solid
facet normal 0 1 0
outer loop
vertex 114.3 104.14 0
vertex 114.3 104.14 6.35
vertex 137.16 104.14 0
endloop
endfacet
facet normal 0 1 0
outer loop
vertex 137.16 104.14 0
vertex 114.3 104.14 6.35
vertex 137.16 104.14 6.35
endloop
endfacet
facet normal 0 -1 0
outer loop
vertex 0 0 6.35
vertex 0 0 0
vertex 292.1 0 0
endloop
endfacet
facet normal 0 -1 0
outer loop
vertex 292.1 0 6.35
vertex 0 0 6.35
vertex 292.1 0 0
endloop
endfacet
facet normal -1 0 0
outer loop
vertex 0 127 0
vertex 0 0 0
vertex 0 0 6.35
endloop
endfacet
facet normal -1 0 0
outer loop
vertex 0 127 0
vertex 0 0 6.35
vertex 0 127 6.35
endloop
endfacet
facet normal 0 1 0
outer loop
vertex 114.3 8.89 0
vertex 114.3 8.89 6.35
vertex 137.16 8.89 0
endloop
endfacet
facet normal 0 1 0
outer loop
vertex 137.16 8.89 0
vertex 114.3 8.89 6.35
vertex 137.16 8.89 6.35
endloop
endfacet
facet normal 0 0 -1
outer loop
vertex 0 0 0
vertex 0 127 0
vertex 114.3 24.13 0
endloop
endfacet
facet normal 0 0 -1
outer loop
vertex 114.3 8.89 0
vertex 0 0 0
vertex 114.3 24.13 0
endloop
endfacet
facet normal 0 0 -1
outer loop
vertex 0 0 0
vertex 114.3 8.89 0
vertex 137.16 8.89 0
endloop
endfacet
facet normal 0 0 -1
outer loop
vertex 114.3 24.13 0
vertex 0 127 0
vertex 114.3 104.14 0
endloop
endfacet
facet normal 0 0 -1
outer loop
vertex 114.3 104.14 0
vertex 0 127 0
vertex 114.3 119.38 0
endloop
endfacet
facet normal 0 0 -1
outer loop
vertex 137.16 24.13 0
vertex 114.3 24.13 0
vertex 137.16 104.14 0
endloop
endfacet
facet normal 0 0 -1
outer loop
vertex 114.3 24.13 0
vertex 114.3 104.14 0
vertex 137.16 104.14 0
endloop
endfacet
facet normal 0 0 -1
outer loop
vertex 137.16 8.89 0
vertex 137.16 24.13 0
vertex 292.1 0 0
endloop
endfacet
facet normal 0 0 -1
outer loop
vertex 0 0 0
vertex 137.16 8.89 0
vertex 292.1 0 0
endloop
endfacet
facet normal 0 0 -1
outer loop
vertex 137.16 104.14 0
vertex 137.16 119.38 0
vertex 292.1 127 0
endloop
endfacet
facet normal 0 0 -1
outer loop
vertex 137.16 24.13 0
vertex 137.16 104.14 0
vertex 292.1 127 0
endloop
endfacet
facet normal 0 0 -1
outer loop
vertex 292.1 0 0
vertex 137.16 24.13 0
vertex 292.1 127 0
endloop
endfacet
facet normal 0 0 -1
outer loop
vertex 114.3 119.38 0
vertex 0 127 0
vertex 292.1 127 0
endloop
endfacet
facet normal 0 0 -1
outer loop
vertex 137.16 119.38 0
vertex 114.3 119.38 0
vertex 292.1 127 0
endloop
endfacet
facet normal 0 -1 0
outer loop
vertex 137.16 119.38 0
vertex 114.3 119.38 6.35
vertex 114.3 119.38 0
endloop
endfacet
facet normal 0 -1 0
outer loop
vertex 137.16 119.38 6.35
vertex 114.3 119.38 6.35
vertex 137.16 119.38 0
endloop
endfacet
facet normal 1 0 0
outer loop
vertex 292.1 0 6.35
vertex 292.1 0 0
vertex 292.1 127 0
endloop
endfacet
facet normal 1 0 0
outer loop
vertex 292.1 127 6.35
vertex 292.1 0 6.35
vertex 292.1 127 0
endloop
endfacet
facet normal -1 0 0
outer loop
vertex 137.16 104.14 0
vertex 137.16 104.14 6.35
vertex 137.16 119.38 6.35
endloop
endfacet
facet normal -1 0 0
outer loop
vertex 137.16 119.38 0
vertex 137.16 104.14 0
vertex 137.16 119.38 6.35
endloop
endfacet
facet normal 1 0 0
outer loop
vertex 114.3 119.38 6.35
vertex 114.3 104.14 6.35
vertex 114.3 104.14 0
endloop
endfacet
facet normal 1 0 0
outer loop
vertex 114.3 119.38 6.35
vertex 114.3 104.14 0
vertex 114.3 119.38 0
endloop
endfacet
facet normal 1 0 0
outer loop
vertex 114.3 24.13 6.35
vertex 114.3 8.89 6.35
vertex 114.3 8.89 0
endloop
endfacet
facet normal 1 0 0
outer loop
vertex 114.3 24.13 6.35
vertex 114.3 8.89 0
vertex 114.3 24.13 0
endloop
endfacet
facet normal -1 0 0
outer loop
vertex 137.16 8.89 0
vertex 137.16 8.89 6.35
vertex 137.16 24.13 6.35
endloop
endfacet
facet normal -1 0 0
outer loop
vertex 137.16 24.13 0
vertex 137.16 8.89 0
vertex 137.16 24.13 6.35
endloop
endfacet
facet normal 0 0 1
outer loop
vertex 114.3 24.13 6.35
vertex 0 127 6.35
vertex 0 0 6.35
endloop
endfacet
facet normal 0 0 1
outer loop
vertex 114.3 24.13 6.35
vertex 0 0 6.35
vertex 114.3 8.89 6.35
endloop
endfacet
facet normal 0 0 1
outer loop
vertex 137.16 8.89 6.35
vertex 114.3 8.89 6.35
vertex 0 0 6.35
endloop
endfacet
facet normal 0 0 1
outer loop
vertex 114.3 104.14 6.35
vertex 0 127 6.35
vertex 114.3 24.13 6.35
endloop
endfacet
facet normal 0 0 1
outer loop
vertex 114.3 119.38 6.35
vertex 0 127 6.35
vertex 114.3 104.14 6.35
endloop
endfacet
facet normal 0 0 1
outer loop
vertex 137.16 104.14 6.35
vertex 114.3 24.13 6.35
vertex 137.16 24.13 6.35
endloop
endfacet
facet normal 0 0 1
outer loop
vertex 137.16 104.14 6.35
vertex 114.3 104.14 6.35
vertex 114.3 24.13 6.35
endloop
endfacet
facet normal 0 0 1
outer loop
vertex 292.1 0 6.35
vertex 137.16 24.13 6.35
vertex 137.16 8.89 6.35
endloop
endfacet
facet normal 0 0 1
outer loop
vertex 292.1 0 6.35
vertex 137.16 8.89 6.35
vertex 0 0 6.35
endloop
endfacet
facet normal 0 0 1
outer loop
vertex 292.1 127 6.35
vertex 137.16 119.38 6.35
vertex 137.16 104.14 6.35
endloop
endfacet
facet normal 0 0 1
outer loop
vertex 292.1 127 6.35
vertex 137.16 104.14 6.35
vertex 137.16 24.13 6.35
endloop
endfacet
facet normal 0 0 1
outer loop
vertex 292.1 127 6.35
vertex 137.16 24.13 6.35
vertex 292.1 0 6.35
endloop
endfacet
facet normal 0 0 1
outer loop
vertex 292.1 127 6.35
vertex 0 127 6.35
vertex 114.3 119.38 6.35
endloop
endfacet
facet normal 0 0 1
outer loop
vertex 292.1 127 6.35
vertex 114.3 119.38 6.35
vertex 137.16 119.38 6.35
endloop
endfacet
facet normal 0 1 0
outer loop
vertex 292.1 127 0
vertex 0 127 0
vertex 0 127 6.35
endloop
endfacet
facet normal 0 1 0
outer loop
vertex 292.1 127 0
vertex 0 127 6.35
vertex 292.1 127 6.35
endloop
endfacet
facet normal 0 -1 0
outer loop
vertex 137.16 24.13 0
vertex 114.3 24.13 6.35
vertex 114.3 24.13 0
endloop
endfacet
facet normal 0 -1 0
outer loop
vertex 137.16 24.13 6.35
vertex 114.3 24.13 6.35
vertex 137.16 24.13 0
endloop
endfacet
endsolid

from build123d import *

# Parameters (mm, degrees)
SKETCH1_W           = 292.1
SKETCH1_H           = 127
BOSS_EXTRUDE1_DEPTH = 6.35
SKETCH2_W           = 22.86
SKETCH2_H           = 15.24
CUT_EXTRUDE1_DEPTH  = 6.35
LPATTERN1_COUNT     = 2
LPATTERN1_PITCH     = 95.25


with BuildPart() as part:
    # Sketch1 → Boss-Extrude1 (new body)
    with BuildSketch(Plane.XY):
        with Locations((146.05, 63.5)):
            Rectangle(SKETCH1_W, SKETCH1_H)
    extrude(amount=BOSS_EXTRUDE1_DEPTH)

    # Sketch2 → Cut-Extrude1 (cut)
    with BuildSketch(Plane.XY.offset(6.35)):
        with Locations((125.73, 16.51)):
            Rectangle(SKETCH2_W, SKETCH2_H)
    cut_extrude1 = extrude(amount=-CUT_EXTRUDE1_DEPTH, mode=Mode.SUBTRACT)

    # LPattern1: Cut-Extrude1 ×2
    with Locations(*[(0, i * LPATTERN1_PITCH, 0) for i in range(1, LPATTERN1_COUNT)]):
        add(cut_extrude1, mode=Mode.SUBTRACT)


solid = part.part
